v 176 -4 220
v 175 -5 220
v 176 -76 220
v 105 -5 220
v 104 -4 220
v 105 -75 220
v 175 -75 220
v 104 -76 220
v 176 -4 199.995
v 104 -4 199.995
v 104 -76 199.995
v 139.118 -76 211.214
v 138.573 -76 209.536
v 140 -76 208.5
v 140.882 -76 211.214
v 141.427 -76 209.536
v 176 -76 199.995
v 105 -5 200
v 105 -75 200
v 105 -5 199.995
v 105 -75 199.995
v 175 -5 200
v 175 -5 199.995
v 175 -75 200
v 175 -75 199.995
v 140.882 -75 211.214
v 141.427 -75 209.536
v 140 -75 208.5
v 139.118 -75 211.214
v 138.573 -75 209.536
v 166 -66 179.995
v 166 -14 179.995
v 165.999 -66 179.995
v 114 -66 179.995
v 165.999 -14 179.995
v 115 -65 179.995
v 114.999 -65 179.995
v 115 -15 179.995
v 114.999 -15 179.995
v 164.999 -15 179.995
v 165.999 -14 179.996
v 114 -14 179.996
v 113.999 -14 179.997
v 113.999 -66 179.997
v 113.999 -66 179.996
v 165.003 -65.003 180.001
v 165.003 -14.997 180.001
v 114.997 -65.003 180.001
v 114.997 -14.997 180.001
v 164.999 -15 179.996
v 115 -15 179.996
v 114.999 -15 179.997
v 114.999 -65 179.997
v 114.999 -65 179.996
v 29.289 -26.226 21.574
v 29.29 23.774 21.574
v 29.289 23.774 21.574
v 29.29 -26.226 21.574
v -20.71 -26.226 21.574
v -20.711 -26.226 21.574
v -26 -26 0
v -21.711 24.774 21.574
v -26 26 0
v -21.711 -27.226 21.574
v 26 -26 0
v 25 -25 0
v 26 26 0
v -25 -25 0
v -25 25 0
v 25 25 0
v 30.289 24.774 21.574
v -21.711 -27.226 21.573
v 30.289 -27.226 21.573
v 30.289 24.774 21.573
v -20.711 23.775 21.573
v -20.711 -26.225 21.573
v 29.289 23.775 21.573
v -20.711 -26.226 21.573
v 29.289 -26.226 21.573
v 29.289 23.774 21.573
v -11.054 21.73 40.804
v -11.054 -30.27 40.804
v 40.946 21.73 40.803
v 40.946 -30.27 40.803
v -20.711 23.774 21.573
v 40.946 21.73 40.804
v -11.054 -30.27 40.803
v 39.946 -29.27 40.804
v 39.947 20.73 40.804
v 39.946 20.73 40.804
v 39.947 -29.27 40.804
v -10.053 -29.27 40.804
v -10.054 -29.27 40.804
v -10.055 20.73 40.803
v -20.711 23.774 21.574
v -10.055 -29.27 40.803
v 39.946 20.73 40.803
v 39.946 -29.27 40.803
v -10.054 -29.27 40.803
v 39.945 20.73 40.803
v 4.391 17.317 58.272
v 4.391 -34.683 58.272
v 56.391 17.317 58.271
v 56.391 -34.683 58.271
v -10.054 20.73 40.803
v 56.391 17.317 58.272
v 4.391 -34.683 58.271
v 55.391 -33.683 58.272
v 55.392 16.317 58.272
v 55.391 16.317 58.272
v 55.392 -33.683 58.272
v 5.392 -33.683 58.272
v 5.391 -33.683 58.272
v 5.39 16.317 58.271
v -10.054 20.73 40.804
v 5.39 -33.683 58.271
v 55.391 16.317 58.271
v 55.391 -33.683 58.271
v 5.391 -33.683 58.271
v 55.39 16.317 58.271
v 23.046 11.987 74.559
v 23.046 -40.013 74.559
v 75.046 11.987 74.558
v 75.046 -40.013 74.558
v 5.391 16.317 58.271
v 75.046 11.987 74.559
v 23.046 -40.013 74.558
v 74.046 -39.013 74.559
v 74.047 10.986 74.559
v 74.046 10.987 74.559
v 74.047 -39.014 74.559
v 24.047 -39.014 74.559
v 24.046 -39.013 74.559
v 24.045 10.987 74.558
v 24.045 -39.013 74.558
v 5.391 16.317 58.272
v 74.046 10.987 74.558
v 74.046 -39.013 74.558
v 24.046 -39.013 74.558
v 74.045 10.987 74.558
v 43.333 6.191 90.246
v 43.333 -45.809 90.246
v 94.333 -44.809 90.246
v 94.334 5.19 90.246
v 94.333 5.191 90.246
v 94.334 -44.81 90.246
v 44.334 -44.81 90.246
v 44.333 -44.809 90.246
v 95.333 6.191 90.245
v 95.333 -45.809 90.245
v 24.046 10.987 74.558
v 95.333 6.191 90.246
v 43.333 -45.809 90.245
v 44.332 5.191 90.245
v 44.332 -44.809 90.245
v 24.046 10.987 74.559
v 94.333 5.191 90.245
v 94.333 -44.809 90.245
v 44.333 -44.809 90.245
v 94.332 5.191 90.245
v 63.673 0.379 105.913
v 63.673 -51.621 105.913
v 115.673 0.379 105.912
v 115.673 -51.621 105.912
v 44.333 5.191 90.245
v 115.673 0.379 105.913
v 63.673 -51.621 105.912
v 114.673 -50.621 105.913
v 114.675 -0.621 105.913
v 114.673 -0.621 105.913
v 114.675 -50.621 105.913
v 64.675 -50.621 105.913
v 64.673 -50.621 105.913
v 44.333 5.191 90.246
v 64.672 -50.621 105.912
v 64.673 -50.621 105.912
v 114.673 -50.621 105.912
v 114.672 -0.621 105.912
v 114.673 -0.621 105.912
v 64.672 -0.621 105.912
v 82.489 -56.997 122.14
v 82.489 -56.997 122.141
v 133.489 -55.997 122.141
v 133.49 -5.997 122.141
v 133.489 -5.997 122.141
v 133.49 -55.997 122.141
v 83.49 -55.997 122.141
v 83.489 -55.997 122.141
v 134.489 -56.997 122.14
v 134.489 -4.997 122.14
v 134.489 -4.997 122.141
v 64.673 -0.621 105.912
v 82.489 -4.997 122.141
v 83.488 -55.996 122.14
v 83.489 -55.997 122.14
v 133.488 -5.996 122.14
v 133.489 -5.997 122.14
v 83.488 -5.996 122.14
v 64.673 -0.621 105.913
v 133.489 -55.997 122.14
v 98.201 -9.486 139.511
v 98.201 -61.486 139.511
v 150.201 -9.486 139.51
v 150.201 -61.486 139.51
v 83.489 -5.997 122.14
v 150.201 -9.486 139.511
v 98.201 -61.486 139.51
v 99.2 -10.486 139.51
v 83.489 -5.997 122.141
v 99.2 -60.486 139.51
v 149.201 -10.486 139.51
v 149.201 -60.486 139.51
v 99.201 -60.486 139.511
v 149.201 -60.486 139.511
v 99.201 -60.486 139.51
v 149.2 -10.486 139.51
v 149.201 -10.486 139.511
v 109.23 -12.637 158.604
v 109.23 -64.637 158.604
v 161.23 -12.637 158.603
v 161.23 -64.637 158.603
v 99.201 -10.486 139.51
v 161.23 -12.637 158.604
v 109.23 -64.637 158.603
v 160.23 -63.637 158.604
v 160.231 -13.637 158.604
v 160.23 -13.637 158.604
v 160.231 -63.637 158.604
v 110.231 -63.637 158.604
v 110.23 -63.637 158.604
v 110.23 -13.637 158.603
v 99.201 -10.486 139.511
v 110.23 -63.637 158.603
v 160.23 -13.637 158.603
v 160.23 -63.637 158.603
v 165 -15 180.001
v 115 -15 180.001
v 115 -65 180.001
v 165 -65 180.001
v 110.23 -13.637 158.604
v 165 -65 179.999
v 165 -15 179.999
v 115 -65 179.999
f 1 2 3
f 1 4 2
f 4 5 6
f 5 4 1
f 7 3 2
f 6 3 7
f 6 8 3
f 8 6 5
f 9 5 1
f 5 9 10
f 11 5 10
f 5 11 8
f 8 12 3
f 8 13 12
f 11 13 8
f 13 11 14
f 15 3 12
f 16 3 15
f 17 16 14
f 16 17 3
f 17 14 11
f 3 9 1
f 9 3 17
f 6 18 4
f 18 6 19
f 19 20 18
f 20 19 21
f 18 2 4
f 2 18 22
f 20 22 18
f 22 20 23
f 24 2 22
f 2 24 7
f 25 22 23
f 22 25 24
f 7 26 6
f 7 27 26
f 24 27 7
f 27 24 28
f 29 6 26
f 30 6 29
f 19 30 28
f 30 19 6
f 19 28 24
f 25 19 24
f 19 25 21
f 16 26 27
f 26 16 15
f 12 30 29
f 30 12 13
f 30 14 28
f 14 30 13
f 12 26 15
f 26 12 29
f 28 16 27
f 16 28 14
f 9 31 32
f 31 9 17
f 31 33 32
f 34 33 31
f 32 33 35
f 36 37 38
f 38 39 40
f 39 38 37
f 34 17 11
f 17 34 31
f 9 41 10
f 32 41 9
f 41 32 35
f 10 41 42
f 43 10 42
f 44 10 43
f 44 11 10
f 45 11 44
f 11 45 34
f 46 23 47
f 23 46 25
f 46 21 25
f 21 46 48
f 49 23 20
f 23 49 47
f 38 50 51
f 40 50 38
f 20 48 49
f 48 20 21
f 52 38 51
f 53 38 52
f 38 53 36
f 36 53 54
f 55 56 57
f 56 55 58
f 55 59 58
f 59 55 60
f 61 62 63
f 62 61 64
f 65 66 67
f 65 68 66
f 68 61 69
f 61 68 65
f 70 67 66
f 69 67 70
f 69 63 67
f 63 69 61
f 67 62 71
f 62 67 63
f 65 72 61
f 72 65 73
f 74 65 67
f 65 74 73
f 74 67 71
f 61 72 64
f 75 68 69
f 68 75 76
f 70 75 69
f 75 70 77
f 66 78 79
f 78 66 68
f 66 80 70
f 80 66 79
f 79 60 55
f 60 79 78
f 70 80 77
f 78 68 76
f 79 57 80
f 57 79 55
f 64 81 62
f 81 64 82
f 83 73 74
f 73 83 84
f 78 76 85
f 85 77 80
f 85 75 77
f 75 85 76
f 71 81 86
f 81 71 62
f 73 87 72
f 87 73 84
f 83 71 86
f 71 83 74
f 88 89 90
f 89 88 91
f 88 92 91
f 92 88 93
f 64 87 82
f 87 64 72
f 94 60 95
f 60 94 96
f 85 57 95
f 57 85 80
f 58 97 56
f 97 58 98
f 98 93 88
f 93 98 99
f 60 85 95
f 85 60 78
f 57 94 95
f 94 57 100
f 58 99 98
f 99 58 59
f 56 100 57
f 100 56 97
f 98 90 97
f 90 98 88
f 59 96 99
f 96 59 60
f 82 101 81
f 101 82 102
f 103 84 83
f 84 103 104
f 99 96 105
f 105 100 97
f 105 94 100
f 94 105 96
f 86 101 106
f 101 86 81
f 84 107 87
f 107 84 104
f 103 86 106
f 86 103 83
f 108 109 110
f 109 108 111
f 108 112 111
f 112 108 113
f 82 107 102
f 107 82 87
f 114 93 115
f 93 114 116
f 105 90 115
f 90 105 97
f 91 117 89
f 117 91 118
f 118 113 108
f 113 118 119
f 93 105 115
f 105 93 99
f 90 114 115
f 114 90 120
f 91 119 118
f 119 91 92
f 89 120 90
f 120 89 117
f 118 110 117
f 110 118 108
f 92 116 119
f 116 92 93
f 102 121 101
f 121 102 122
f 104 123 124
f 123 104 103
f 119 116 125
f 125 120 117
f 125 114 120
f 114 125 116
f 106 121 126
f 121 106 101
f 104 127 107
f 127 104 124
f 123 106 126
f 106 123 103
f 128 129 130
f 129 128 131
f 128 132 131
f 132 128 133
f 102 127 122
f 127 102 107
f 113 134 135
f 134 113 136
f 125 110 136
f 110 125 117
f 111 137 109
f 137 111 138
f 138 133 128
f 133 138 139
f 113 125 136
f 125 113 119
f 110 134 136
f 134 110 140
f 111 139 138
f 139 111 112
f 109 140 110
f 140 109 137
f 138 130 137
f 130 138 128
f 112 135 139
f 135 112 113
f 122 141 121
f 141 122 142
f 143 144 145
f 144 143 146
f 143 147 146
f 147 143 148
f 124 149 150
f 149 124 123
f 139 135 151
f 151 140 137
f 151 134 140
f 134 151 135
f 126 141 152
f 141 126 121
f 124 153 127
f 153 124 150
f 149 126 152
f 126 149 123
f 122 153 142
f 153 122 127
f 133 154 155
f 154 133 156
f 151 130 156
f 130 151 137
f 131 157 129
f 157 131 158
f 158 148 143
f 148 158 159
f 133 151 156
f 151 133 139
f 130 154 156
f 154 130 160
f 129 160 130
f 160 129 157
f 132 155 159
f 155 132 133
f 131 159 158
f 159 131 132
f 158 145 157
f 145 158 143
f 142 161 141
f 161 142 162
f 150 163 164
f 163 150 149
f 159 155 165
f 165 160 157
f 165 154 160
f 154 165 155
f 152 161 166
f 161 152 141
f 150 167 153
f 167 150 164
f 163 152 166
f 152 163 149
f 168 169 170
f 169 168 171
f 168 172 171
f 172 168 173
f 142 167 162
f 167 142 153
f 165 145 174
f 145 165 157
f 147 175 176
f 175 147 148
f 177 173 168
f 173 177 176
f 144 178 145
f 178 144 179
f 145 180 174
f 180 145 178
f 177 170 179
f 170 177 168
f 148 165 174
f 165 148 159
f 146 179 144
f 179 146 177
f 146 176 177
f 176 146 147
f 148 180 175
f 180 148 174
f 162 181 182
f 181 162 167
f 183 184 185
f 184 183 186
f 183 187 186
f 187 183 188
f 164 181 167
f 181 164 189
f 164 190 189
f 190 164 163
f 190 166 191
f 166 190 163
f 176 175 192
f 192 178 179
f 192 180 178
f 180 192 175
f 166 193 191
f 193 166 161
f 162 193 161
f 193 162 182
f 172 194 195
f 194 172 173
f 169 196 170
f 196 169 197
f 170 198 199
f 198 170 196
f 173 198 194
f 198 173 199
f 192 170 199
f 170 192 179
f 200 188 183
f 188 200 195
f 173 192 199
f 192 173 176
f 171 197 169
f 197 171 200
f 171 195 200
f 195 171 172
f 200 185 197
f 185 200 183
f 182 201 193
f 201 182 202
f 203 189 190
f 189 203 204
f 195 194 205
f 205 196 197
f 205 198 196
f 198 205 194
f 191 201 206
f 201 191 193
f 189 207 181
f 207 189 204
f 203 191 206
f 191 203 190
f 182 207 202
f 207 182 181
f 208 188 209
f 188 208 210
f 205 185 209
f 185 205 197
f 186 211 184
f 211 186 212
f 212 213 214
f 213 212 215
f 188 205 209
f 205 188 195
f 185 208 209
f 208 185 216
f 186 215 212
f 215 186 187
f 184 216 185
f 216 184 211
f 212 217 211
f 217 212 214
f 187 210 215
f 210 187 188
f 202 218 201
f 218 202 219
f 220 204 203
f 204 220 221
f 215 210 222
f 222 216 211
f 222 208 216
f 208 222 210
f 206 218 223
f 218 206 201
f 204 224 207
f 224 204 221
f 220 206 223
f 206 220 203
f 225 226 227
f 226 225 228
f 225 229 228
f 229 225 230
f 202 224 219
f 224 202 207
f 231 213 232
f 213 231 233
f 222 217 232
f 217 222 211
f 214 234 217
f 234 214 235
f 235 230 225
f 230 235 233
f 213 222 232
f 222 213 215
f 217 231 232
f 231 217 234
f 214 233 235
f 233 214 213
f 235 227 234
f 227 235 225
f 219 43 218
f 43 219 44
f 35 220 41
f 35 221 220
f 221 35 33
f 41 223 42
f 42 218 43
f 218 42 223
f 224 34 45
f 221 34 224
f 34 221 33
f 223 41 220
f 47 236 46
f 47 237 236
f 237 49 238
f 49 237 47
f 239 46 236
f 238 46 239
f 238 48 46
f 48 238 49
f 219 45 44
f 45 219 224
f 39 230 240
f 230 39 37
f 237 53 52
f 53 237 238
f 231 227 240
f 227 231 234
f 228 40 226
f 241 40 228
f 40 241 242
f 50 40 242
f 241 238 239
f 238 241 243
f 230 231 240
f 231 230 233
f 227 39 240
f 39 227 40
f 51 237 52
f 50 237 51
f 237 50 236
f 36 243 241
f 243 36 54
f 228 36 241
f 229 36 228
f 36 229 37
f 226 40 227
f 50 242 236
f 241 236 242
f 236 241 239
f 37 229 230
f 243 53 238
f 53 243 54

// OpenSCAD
points3d = [
  [0, 0, -10],
  [0, 0, 0],
  [140, -40, 180],
  [140, -40, 200],
];


downpipe_size = 70;
gutter_size = 50;

module downpipe_connector() {
  bottom = points3d[len(points3d) - 2];
  translate(bottom) {
    translate([0, 0, 20]) {
      difference() {
        linear_extrude(20)
          difference() {
            square([downpipe_size + 2, downpipe_size + 2], center = true);
            square([downpipe_size, downpipe_size], center = true);
          }
          translate([0, -(downpipe_size / 2) - 2, 10])
            rotate(90, [0, 0, 1])
              rotate(90, [0, 1, 0])
                cylinder(r = 1.5, h = 4);
        }
      }
    difference() {
      hull() {
        translate([0, 0, 20])
          cube([downpipe_size + 2, downpipe_size + 2, 0.01], center = true);
        cube([gutter_size + 2, gutter_size + 2, 0.01], center = true);
      }
      hull() {
        translate([0, 0, 20])
          cube([downpipe_size, downpipe_size, 0.01], center = true);
        cube([gutter_size, gutter_size, 0.01], center = true);
      }
    }
  }
}

downpipe_connector();

function sliding_2(xs) =
  [for (i = [0 : len(xs) - 2]) [xs[i], xs[i + 1]]];

function sliding_3(xs) =
  [for (i = [0 : len(xs) - 3]) [xs[i], xs[i + 1], xs[i + 2]]];

function sliding_4(xs) =
  [for (i = [0 : len(xs) - 4]) [xs[i], xs[i + 1], xs[i + 2], xs[i + 3]]];

function cumsum(list, i = 0, acc = []) =
  i >= len(list) ? acc :
  cumsum(list, i + 1, concat(acc, [i == 0 ? list[0] : acc[i-1] + list[i]]));

function lerp_knot(pa, pb, ta, tb, t) = 
  pa + (t - ta) / (tb - ta) * (pb - pa);

function catmull_rom_segment(P0, P1, P2, P3, t0, t1, t2, t3, steps) = [
  for (i = [0 : steps])
    let(
      t = t1 + i * (t2 - t1) / steps,
      A1 = lerp_knot(P0, P1, t0, t1, t),
      A2 = lerp_knot(P1, P2, t1, t2, t),
      A3 = lerp_knot(P2, P3, t2, t3, t),
      B1 = lerp_knot(A1, A2, t0, t2, t),
      B2 = lerp_knot(A2, A3, t1, t3, t),
      C = lerp_knot(B1, B2, t1, t2, t)
    ) C
];

function catmull_rom_spline(ps, alpha = 1, steps = 10) =
  let(
    intervals = [
      for (window = sliding_2(ps))
        pow(norm(window[1] - window[0]), alpha)
    ],
    knots = concat([0], cumsum(intervals)),
    segments = [
      for (i = [0 : len(ps) - 4])
        let(
          seg = sliding_4(ps)[i],
          P0 = seg[0], P1 = seg[1], P2 = seg[2], P3 = seg[3],
          t0 = knots[i], t1 = knots[i+1], t2 = knots[i+2], t3 = knots[i+3]
        )
        catmull_rom_segment(P0, P1, P2, P3, t0, t1, t2, t3, steps)
    ]
  )
  [for (segment = segments) for (point = segment) point];

module tube(p1, p2) {
  module profile(s)
    cube([s, s, 0.001], center=true);

  module shape(s)
    hull() {
      translate(p1) profile(s);
      translate(p2) profile(s);
    }

  difference() {
    shape(gutter_size + 2);
    shape(gutter_size);
  }
}

module catmull_rom(ps, diameter = 1) {
  spline_points = catmull_rom_spline(ps);
  for (window = sliding_2(spline_points)) {
    tube(window[0], window[1]);
  }
}

// tube([0, 0, 0], [50, 0, 50]);
// color("blue") simple();
color("red") catmull_rom(points3d, 2);
